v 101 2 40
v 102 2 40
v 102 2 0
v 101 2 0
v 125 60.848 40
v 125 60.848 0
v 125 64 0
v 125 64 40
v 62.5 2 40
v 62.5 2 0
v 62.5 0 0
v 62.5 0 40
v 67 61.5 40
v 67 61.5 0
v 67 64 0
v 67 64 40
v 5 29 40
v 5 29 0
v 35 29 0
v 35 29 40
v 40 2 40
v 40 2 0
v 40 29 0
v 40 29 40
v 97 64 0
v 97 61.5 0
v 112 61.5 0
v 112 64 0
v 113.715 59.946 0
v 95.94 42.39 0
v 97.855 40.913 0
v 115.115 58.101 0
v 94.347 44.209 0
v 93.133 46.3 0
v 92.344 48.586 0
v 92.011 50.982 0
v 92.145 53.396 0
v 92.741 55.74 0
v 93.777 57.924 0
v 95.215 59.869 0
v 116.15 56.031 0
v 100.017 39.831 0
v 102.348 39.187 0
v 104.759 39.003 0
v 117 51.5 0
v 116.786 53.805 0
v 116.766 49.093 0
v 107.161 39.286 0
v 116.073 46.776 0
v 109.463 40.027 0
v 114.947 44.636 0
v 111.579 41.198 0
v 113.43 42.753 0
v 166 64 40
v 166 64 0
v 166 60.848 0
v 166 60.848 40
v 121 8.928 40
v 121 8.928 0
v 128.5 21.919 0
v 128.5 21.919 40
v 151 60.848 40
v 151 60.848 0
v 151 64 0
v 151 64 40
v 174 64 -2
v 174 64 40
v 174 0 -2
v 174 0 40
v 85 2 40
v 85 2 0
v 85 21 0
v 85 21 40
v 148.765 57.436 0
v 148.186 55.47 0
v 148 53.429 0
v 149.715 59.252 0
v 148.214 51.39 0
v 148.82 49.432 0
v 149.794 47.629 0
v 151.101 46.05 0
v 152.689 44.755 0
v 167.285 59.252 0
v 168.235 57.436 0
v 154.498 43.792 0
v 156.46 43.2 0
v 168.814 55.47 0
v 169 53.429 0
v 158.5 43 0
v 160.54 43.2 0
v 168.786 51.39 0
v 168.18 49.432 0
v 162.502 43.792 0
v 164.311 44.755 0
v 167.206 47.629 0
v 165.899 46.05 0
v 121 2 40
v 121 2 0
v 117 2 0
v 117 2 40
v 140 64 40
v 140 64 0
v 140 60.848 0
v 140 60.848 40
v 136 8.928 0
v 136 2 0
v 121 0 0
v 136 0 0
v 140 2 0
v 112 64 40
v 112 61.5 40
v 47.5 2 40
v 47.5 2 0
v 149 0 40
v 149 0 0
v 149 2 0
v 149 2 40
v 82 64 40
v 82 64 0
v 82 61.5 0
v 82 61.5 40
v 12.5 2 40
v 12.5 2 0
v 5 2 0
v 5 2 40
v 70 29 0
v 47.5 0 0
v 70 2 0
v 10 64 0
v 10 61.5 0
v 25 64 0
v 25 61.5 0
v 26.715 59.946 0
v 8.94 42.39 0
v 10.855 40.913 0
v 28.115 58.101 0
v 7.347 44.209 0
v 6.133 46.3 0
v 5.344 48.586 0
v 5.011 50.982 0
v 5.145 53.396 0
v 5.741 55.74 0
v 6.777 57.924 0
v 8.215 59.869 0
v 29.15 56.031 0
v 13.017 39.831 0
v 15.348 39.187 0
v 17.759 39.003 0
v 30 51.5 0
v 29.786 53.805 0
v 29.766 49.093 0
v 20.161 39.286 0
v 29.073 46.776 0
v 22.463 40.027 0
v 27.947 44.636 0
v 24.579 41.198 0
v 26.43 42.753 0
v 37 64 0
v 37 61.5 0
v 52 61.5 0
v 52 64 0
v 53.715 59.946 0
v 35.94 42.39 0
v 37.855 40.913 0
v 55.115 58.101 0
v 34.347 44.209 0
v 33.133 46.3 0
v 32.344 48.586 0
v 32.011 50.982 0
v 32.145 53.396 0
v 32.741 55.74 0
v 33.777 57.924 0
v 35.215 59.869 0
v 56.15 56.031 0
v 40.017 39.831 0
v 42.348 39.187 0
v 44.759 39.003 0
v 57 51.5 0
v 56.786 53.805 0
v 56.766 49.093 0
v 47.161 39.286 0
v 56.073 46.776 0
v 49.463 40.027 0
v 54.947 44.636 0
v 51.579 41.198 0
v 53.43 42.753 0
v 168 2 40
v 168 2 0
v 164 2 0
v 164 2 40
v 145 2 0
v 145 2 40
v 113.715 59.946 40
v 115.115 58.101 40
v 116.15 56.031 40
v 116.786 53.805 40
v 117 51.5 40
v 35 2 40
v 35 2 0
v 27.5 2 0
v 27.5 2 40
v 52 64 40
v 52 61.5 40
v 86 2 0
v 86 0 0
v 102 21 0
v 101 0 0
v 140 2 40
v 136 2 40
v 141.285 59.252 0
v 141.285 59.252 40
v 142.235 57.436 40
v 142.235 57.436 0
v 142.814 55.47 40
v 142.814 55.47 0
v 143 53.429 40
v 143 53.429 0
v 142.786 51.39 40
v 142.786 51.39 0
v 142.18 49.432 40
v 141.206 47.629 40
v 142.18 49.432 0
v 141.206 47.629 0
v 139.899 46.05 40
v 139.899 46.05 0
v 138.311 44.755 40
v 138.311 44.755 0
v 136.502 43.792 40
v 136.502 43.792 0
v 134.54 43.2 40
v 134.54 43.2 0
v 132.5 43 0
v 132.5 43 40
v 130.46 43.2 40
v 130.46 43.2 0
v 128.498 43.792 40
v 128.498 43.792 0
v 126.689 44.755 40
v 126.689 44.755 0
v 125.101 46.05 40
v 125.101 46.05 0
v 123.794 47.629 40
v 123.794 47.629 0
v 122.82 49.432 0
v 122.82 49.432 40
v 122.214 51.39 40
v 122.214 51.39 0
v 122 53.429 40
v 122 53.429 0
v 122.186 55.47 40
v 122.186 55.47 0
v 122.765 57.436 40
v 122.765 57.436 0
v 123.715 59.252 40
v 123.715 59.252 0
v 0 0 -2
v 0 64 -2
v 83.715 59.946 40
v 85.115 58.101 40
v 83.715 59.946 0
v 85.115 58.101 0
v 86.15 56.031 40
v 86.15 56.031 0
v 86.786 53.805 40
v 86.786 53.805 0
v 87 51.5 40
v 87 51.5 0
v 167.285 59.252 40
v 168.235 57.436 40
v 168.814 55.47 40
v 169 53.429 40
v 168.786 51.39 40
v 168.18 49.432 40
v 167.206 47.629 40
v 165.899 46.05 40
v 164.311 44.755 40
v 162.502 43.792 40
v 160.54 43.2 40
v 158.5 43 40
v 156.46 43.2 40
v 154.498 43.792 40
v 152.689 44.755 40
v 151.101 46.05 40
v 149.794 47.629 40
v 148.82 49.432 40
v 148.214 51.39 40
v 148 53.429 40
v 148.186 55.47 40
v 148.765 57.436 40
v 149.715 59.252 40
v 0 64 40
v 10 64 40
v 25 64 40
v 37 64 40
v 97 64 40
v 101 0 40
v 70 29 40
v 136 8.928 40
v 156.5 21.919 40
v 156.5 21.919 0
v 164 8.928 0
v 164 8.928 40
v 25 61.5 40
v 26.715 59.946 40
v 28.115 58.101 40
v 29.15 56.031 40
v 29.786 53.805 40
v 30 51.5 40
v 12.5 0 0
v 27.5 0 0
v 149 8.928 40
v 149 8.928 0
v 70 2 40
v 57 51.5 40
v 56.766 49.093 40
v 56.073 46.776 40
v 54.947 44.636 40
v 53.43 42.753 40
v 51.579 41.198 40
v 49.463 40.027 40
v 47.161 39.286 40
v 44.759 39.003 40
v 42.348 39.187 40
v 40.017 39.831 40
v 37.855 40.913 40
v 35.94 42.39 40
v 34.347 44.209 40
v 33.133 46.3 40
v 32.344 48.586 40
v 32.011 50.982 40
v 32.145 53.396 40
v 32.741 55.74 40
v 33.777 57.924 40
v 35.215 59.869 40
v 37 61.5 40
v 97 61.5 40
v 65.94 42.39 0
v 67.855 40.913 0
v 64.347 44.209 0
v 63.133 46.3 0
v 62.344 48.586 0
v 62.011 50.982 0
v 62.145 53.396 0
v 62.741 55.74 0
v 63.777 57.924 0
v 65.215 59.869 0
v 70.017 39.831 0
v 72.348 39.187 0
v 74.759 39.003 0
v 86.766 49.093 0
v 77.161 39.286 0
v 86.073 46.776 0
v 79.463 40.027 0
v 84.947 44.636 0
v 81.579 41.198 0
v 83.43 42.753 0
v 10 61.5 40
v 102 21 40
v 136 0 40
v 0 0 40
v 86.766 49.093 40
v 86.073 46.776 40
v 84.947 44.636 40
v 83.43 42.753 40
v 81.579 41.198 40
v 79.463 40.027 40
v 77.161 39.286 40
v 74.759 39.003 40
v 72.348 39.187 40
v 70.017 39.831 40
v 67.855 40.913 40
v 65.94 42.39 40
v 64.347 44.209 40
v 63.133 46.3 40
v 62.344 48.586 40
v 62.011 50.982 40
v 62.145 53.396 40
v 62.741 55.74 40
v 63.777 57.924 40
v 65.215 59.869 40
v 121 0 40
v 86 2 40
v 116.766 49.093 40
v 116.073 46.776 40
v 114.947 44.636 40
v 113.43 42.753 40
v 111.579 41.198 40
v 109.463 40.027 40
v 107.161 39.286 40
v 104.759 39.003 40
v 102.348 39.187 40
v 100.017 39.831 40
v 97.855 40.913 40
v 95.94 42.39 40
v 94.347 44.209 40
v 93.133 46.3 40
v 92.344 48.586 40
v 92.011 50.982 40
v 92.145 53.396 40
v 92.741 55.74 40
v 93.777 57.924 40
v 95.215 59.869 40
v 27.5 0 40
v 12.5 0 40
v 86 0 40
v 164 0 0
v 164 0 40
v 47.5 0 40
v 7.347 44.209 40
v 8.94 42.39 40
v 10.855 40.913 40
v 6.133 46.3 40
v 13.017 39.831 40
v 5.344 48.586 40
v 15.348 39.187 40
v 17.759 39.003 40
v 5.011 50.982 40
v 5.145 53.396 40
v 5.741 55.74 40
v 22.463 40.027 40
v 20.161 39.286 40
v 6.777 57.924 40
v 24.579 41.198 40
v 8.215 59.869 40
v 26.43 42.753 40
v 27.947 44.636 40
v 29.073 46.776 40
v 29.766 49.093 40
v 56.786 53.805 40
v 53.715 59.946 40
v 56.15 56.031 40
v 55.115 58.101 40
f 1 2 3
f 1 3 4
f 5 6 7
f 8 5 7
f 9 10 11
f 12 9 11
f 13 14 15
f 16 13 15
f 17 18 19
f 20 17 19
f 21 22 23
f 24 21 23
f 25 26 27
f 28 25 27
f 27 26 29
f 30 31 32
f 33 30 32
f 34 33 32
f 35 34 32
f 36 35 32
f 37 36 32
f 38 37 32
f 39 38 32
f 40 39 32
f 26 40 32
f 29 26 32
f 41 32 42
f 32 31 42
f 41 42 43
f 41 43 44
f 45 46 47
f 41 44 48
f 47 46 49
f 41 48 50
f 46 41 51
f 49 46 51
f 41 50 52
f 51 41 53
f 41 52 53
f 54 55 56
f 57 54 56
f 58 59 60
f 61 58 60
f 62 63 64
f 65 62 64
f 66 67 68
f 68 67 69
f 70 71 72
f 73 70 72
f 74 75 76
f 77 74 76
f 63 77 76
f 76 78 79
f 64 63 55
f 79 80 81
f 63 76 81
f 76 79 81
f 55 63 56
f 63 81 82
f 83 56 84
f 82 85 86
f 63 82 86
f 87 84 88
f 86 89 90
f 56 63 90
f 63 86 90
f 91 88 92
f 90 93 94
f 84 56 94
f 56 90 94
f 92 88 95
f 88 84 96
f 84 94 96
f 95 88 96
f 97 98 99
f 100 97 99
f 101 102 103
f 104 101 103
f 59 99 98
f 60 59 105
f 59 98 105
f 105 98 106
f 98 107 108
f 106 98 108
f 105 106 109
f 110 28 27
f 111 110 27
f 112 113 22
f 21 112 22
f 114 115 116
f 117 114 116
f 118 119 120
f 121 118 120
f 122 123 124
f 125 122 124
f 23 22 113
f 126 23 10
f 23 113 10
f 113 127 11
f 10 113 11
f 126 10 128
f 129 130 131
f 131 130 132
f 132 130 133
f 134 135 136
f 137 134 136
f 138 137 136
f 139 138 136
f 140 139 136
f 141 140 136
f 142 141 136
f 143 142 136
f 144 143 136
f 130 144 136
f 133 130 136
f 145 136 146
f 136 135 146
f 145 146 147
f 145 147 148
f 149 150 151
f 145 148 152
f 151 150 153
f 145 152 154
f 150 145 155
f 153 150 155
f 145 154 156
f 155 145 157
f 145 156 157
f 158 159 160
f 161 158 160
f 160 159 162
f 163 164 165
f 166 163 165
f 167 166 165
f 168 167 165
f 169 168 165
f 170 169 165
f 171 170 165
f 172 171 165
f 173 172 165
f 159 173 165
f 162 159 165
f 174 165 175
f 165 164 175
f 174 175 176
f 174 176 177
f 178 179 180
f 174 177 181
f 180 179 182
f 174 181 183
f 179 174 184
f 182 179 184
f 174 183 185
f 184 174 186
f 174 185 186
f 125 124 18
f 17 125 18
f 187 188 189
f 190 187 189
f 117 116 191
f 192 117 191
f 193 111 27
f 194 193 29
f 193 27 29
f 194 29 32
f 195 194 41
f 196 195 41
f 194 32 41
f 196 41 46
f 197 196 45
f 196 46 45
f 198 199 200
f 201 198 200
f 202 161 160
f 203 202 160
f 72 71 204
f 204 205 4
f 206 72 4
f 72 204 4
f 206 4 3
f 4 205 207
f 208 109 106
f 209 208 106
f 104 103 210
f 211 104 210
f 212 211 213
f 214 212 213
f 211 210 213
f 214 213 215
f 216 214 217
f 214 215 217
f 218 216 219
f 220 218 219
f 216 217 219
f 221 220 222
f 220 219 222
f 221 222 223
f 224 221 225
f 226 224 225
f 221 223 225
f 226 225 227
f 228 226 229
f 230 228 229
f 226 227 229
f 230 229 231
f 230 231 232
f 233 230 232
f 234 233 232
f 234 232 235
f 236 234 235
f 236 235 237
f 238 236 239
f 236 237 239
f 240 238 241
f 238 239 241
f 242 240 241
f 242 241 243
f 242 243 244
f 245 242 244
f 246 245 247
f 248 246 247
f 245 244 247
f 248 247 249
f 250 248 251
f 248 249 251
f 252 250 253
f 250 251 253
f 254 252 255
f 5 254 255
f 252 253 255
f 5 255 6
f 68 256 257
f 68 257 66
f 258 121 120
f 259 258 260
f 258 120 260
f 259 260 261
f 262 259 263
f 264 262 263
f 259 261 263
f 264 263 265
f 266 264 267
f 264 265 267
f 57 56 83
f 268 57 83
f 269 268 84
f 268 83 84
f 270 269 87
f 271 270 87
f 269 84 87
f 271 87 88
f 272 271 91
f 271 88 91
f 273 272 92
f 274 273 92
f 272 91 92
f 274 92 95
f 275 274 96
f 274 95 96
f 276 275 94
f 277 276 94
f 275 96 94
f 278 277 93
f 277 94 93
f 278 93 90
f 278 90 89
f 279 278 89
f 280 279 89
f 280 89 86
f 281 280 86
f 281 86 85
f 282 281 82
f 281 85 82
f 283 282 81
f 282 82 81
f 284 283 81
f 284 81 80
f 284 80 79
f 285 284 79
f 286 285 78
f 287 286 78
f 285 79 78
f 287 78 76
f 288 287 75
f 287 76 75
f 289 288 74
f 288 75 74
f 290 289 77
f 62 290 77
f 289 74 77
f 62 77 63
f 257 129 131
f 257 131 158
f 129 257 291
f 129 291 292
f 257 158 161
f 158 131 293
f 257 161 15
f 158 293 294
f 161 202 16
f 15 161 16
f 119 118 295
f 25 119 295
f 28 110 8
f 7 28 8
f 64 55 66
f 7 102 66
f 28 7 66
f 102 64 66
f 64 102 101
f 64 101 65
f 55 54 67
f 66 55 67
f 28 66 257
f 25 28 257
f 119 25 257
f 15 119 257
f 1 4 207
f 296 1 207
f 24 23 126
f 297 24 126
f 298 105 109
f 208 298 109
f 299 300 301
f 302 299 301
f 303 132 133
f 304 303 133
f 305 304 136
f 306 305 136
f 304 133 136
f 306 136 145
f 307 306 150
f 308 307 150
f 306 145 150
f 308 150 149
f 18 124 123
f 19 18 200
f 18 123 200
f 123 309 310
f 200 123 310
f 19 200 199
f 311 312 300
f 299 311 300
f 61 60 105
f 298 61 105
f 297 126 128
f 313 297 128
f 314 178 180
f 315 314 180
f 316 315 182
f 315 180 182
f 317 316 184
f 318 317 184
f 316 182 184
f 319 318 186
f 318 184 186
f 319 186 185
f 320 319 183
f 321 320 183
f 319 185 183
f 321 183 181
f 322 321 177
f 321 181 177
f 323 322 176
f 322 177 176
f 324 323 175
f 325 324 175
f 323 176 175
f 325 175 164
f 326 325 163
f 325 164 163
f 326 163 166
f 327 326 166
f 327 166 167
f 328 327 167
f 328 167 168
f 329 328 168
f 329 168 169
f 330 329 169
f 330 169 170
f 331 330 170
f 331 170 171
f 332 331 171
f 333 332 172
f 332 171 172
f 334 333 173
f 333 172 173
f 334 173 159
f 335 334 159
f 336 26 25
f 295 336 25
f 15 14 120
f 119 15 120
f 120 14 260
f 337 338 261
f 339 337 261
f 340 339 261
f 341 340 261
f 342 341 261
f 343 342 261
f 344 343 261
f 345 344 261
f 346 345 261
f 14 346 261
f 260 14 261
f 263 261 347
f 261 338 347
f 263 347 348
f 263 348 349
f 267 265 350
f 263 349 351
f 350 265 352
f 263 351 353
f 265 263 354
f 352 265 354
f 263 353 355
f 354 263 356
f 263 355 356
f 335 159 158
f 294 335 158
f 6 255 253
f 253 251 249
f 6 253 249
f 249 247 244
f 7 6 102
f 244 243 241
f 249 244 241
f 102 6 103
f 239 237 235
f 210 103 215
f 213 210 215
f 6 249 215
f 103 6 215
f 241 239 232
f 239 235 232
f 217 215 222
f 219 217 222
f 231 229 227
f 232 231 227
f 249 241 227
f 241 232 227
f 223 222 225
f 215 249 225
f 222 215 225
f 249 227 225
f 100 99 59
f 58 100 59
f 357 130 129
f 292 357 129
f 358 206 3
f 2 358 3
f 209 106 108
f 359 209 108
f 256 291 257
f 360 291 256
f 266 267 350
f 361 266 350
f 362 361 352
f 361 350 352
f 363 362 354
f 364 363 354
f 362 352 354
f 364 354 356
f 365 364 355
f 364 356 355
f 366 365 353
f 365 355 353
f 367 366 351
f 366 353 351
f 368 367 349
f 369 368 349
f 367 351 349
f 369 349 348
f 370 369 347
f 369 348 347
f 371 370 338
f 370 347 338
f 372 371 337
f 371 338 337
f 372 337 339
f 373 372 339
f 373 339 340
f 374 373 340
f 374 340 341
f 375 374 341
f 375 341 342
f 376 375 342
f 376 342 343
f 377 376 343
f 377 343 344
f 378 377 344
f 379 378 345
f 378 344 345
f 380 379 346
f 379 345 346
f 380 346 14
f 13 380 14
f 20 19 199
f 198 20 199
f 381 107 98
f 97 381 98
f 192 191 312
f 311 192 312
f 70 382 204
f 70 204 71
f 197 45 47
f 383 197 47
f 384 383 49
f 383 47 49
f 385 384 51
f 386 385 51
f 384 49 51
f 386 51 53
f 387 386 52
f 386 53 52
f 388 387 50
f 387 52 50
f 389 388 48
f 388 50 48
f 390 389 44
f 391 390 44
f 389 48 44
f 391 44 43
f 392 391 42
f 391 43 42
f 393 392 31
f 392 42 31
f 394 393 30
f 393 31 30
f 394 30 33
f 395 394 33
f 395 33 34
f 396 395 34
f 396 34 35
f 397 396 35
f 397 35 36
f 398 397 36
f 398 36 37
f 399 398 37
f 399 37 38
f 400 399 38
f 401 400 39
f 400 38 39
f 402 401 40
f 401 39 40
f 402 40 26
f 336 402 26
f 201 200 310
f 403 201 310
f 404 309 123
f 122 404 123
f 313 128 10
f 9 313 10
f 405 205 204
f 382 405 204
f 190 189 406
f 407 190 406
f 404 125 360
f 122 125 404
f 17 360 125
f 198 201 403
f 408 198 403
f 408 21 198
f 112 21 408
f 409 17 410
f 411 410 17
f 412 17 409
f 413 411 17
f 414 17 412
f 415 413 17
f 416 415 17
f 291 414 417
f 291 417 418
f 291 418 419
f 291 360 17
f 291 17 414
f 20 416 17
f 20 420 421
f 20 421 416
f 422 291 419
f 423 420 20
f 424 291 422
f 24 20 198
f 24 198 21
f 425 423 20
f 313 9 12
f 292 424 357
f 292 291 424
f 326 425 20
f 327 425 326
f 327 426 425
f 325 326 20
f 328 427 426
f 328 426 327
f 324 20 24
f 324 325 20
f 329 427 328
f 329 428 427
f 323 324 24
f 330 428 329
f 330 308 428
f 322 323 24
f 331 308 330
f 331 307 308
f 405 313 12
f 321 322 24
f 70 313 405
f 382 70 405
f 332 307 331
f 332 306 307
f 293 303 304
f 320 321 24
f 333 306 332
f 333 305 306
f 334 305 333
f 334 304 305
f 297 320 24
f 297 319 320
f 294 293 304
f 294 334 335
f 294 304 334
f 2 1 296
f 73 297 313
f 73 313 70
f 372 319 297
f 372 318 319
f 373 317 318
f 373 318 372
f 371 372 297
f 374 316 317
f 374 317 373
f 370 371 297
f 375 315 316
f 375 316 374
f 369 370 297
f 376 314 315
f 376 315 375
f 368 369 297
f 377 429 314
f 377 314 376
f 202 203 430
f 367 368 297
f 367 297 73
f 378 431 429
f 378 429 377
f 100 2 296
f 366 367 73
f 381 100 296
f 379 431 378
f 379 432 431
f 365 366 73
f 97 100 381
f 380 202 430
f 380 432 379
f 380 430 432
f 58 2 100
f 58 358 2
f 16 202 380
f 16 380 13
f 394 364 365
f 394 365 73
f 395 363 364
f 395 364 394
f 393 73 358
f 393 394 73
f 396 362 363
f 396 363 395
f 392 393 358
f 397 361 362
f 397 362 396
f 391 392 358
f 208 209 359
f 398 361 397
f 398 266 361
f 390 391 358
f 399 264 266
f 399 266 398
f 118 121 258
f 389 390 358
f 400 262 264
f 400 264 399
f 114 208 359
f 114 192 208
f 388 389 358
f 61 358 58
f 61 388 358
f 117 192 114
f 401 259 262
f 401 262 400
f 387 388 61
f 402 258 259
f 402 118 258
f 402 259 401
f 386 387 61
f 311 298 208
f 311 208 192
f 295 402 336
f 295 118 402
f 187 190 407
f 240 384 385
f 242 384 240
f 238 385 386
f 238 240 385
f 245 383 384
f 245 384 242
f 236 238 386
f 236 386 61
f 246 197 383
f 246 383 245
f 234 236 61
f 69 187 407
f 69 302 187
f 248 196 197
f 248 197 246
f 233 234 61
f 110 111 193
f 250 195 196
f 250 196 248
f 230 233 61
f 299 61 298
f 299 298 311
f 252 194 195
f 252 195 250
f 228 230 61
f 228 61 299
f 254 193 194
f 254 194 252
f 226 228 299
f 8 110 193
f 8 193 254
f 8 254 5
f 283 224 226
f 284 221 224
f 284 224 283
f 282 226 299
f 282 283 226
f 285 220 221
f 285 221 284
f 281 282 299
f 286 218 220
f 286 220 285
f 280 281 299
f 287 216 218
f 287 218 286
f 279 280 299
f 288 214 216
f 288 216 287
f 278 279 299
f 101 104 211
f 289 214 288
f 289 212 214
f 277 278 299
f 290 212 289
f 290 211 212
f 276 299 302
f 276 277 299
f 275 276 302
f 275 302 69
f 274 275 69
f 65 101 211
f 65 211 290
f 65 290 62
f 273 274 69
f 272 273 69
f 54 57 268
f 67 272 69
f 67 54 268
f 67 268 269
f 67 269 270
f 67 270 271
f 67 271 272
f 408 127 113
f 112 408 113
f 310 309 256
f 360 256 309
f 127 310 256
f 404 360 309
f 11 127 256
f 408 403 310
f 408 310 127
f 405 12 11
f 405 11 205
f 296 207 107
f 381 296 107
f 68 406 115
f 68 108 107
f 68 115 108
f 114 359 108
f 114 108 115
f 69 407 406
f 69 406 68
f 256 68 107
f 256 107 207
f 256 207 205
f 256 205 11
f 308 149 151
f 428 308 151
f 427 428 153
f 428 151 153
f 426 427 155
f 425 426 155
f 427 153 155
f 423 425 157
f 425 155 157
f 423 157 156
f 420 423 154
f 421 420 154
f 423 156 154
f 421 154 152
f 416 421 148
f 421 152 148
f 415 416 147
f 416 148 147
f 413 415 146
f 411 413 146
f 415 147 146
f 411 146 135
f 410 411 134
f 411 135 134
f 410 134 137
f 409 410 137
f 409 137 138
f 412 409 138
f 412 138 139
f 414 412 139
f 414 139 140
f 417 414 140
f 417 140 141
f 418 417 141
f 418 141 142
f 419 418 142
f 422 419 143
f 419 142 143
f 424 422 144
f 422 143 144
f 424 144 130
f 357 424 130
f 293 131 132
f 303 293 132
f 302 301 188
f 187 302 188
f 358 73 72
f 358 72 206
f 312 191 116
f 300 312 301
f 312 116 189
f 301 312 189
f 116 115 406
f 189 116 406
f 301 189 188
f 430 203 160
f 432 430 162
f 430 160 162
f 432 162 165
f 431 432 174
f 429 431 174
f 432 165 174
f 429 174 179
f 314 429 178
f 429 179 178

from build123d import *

# Parameters (mm, degrees)
F1_DEPTH = 40
F2_W     = 174
F2_H     = 64
F3_DEPTH = 2


with BuildPart() as f1:
    # F0 (on Top) → F1 (new body)
    with BuildSketch(Plane.XY):
        with BuildLine():
            Line((0, 64), (0, 0))
            Line((0, 0), (12.5, 0))
            Line((12.5, 0), (12.5, 2))
            Line((12.5, 2), (5, 2))
            Line((5, 2), (5, 29))
            Line((5, 29), (35, 29))
            Line((35, 29), (35, 2))
            Line((35, 2), (27.5, 2))
            Line((27.5, 2), (27.5, 0))
            Line((27.5, 0), (47.5, 0))
            Line((47.5, 0), (47.5, 2))
            Line((47.5, 2), (40, 2))
            Line((40, 2), (40, 29))
            Line((40, 29), (70, 29))
            Line((70, 29), (70, 2))
            Line((70, 2), (62.5, 2))
            Line((62.5, 2), (62.5, 0))
            Line((62.5, 0), (86, 0))
            Line((86, 0), (86, 2))
            Line((86, 2), (85, 2))
            Line((85, 2), (85, 21))
            Line((85, 21), (102, 21))
            Line((102, 21), (102, 2))
            Line((102, 2), (101, 2))
            Line((101, 2), (101, 0))
            Line((101, 0), (121, 0))
            Line((121, 0), (121, 2))
            Line((121, 2), (117, 2))
            Line((117, 2), (121, 8.9282032303))
            Line((121, 8.9282032303), (128.5, 21.918584287))
            Line((128.5, 21.918584287), (136, 8.9282032303))
            Line((136, 8.9282032303), (140, 2))
            Line((140, 2), (136, 2))
            Line((136, 2), (136, 0))
            Line((136, 0), (149, 0))
            Line((149, 0), (149, 2))
            Line((149, 2), (145, 2))
            Line((145, 2), (149, 8.9282032303))
            Line((149, 8.9282032303), (156.5, 21.918584287))
            Line((156.5, 21.918584287), (164, 8.9282032303))
            Line((164, 8.9282032303), (168, 2))
            Line((168, 2), (164, 2))
            Line((164, 2), (164, 0))
            Line((164, 0), (174, 0))
            Line((174, 0), (174, 64))
            Line((174, 64), (166, 64))
            Line((166, 64), (166, 60.8484692283))
            ThreePointArc((166, 60.8484692283), (168.2211110476, 57.4686269666), (169, 53.5))
            ThreePointArc((169, 53.5), (154.5313730334, 43.7788889524), (151, 60.8484692283))
            Line((151, 60.8484692283), (151, 64))
            Line((151, 64), (140, 64))
            Line((140, 64), (140, 60.8484692283))
            ThreePointArc((140, 60.8484692283), (142.2211110476, 57.4686269666), (143, 53.5))
            ThreePointArc((143, 53.5), (128.5313730334, 43.7788889524), (125, 60.8484692283))
            Line((125, 60.8484692283), (125, 64))
            Line((125, 64), (112, 64))
            Line((112, 64), (112, 61.5))
            ThreePointArc((112, 61.5), (115.6803398875, 57.0901699437), (117, 51.5))
            ThreePointArc((117, 51.5), (98.9098300563, 40.3196601125), (97, 61.5))
            Line((97, 61.5), (97, 64))
            Line((97, 64), (82, 64))
            Line((82, 64), (82, 61.5))
            ThreePointArc((82, 61.5), (85.6803398875, 57.0901699437), (87, 51.5))
            ThreePointArc((87, 51.5), (68.9098300563, 40.3196601125), (67, 61.5))
            Line((67, 61.5), (67, 64))
            Line((67, 64), (52, 64))
            Line((52, 64), (52, 61.5))
            ThreePointArc((52, 61.5), (55.6803398875, 57.0901699437), (57, 51.5))
            ThreePointArc((57, 51.5), (38.9098300563, 40.3196601125), (37, 61.5))
            Line((37, 61.5), (37, 64))
            Line((37, 64), (25, 64))
            Line((25, 64), (25, 61.5))
            ThreePointArc((25, 61.5), (28.6803398875, 57.0901699437), (30, 51.5))
            ThreePointArc((30, 51.5), (11.9098300563, 40.3196601125), (10, 61.5))
            Line((10, 61.5), (10, 64))
            Line((10, 64), (0, 64))
        make_face()
    extrude(amount=F1_DEPTH)

    # F2 (on face) → F3 (join)
    with BuildSketch(Plane(origin=(0, 0, 0), x_dir=(1, 0, 0), z_dir=(0, 0, -1))):
        with Locations((87, -32)):
            Rectangle(F2_W, F2_H)
    extrude(amount=F3_DEPTH)


solid = f1.part
